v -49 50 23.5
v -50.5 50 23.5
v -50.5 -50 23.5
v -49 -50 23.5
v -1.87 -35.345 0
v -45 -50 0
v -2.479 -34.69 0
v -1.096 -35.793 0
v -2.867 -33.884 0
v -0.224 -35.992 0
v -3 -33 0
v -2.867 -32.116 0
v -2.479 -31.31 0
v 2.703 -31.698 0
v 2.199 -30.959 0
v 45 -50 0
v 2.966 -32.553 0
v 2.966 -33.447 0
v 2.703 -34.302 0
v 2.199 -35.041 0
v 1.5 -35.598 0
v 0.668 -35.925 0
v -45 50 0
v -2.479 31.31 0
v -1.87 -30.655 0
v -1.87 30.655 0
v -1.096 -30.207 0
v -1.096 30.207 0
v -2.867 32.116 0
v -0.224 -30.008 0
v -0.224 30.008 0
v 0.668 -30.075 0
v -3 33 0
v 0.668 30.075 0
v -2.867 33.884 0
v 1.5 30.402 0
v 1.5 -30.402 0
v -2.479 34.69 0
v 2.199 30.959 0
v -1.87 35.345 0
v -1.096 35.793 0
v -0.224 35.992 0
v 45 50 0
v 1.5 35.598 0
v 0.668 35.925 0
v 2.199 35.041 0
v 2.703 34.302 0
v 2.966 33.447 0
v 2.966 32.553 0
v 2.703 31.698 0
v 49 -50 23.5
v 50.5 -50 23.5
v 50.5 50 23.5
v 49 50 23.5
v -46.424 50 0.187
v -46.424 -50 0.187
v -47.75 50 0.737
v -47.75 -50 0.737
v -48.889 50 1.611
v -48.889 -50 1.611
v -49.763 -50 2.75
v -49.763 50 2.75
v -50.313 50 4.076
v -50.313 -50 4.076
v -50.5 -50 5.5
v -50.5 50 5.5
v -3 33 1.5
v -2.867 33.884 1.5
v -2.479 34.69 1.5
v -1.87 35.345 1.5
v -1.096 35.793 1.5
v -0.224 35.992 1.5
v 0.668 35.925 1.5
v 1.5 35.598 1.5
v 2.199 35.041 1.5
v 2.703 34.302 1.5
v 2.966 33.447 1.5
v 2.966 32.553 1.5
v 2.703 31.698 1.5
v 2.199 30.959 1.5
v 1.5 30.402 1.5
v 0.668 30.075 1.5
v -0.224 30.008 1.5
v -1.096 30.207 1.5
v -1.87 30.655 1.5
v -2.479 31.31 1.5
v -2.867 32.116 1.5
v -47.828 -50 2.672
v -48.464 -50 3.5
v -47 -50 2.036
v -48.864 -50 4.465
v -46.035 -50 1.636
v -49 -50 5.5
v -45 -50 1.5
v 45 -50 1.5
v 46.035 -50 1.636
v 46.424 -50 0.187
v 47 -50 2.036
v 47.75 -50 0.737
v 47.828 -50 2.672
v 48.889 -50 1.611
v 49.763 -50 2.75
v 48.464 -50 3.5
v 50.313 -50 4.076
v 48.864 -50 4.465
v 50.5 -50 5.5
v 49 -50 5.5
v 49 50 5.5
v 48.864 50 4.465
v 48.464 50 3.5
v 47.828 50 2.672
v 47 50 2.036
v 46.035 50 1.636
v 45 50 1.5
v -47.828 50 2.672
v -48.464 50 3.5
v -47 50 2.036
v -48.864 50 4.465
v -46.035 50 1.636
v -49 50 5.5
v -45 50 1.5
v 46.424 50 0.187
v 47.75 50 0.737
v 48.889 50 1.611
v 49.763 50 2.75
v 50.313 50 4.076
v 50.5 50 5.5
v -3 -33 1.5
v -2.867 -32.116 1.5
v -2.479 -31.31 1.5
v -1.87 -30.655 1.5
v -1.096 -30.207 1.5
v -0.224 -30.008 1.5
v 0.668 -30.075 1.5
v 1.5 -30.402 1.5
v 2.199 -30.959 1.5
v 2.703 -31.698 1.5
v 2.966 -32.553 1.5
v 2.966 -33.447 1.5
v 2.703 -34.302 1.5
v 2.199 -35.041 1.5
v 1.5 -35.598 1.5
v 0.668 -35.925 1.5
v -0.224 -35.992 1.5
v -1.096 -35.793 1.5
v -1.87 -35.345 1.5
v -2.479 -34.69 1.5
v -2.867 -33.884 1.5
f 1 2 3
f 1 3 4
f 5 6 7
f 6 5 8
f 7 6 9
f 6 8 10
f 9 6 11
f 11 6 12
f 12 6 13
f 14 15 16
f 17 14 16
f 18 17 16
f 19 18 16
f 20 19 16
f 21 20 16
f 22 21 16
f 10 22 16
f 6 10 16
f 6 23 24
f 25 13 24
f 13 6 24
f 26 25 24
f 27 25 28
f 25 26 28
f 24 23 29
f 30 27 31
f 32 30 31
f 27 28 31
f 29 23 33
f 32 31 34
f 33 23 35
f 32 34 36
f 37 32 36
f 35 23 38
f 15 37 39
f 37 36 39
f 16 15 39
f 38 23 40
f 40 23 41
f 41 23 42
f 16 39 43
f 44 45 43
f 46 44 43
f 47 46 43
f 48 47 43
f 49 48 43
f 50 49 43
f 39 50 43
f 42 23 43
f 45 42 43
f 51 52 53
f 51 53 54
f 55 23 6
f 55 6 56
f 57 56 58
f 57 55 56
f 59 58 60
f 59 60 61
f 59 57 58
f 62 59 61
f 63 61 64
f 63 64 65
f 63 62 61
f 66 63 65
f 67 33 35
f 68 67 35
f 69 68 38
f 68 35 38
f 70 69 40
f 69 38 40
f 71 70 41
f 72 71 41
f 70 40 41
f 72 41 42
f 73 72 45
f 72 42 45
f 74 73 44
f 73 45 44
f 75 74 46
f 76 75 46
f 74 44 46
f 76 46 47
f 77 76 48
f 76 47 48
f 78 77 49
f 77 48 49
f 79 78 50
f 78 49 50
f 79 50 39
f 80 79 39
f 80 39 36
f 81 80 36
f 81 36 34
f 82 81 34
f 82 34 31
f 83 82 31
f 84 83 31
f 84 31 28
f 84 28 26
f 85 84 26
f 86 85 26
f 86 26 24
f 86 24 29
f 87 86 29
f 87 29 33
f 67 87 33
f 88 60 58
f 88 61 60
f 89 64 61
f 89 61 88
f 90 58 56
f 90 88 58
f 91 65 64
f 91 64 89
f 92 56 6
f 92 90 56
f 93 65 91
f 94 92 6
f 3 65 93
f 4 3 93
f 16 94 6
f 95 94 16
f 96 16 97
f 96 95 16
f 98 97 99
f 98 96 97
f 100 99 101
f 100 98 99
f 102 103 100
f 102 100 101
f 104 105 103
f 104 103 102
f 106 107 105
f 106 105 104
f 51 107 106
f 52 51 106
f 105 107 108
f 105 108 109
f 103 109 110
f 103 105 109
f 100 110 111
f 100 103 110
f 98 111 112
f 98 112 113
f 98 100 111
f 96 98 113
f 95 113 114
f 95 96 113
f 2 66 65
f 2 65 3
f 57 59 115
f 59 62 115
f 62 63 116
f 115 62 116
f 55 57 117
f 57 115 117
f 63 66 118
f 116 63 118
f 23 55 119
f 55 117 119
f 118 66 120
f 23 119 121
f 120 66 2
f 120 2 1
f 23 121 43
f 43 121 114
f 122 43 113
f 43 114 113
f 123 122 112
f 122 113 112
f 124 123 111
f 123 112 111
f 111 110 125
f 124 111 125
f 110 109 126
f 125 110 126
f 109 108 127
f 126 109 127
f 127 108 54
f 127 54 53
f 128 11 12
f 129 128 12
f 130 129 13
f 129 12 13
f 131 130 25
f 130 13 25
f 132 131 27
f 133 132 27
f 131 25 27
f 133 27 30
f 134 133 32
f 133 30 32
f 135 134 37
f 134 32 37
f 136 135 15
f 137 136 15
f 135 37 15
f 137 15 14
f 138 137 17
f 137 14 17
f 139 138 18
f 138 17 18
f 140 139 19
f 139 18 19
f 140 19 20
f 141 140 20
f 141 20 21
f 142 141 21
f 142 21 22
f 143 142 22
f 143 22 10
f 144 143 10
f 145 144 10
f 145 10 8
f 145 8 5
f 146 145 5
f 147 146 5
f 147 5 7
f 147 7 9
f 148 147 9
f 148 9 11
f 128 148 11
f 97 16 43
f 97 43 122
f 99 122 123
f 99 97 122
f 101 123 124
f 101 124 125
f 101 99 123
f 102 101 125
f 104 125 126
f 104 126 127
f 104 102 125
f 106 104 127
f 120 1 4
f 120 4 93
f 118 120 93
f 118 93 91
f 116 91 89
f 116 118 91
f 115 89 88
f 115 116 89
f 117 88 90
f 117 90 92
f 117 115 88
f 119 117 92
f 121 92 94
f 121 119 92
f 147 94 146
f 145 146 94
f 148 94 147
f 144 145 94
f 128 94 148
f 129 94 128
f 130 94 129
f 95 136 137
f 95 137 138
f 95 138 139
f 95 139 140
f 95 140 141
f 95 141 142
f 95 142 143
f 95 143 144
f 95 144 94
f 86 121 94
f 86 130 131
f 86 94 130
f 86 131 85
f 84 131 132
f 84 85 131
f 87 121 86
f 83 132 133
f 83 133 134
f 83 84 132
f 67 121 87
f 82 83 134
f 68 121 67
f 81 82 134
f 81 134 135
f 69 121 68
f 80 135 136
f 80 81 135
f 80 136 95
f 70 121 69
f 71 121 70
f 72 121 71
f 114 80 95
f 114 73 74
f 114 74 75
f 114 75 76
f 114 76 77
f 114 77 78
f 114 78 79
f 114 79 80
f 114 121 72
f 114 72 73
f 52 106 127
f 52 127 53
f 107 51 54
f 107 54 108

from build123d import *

# Parameters (mm, degrees)
SKETCH1_W                = 90
SKETCH1_H                = 100
BOSS_EXTRUDE1_DEPTH      = 10
CONVERT_SOLID1_START     = 1.5
CONVERT_SOLID1_OUTLINE_W = 90
CONVERT_SOLID1_OUTLINE_H = 100
CONVERT_SOLID1_DEPTH     = 8.5
EDGE_FLANGE1_DEPTH       = 100
EDGE_FLANGE2_DEPTH       = 100
SKETCH12_R               = 3
CUT_EXTRUDE1_DEPTH       = 75.849849699


# Read off the part's stored shape, not the designer's step: Convert-Solid1
# Sheet-metal steps are written as plain solids
with BuildPart() as part:
    # Sketch1 → Boss-Extrude1 (new body)
    with BuildSketch(Plane.XY):
        Rectangle(SKETCH1_W, SKETCH1_H)
    extrude(amount=BOSS_EXTRUDE1_DEPTH)

    # Convert-Solid1 outline → Convert-Solid1 (cut)
    with BuildSketch(Plane.XY.offset(CONVERT_SOLID1_START)):
        Rectangle(CONVERT_SOLID1_OUTLINE_W, CONVERT_SOLID1_OUTLINE_H)
    extrude(amount=CONVERT_SOLID1_DEPTH, mode=Mode.SUBTRACT)

    # Edge-Flange1 section (across the edge) → Edge-Flange1 (add)
    with BuildSketch(Plane(origin=(-49, 50, 1.5), x_dir=(1, 0, 0), z_dir=(0, -1, 0))):
        with BuildLine():
            Line((-1.5, 4), (-1.5, 22))
            Line((-1.5, 22), (0, 22))
            Line((0, 22), (0, 4))
            ThreePointArc((0, 4), (1.171572875, 1.171572875), (4, 0))
            Line((4, 0), (4, -1.5))
            ThreePointArc((4, -1.5), (0.110912703, 0.110912703), (-1.5, 4))
        make_face()
    extrude(amount=EDGE_FLANGE1_DEPTH)

    # Edge-Flange2 section (across the edge) → Edge-Flange2 (add)
    with BuildSketch(Plane(origin=(49, -50, 1.5), x_dir=(-1, 0, 0), z_dir=(0, 1, 0))):
        with BuildLine():
            Line((-1.5, 4), (-1.5, 22))
            Line((-1.5, 22), (0, 22))
            Line((0, 22), (0, 4))
            ThreePointArc((0, 4), (1.171572875, 1.171572875), (4, 0))
            Line((4, 0), (4, -1.5))
            ThreePointArc((4, -1.5), (0.110912703, 0.110912703), (-1.5, 4))
        make_face()
    extrude(amount=EDGE_FLANGE2_DEPTH)

    # Sketch12 → Cut-Extrude1 (cut, through all)
    with BuildSketch(Plane(origin=(0, 0, 0), x_dir=(-1, 0, 0), z_dir=(0, 0, -1))):
        with Locations((0, 33)):
            Circle(SKETCH12_R)
        with Locations((0, -33)):
            Circle(SKETCH12_R)
    extrude(amount=-CUT_EXTRUDE1_DEPTH, mode=Mode.SUBTRACT)


solid = part.part
